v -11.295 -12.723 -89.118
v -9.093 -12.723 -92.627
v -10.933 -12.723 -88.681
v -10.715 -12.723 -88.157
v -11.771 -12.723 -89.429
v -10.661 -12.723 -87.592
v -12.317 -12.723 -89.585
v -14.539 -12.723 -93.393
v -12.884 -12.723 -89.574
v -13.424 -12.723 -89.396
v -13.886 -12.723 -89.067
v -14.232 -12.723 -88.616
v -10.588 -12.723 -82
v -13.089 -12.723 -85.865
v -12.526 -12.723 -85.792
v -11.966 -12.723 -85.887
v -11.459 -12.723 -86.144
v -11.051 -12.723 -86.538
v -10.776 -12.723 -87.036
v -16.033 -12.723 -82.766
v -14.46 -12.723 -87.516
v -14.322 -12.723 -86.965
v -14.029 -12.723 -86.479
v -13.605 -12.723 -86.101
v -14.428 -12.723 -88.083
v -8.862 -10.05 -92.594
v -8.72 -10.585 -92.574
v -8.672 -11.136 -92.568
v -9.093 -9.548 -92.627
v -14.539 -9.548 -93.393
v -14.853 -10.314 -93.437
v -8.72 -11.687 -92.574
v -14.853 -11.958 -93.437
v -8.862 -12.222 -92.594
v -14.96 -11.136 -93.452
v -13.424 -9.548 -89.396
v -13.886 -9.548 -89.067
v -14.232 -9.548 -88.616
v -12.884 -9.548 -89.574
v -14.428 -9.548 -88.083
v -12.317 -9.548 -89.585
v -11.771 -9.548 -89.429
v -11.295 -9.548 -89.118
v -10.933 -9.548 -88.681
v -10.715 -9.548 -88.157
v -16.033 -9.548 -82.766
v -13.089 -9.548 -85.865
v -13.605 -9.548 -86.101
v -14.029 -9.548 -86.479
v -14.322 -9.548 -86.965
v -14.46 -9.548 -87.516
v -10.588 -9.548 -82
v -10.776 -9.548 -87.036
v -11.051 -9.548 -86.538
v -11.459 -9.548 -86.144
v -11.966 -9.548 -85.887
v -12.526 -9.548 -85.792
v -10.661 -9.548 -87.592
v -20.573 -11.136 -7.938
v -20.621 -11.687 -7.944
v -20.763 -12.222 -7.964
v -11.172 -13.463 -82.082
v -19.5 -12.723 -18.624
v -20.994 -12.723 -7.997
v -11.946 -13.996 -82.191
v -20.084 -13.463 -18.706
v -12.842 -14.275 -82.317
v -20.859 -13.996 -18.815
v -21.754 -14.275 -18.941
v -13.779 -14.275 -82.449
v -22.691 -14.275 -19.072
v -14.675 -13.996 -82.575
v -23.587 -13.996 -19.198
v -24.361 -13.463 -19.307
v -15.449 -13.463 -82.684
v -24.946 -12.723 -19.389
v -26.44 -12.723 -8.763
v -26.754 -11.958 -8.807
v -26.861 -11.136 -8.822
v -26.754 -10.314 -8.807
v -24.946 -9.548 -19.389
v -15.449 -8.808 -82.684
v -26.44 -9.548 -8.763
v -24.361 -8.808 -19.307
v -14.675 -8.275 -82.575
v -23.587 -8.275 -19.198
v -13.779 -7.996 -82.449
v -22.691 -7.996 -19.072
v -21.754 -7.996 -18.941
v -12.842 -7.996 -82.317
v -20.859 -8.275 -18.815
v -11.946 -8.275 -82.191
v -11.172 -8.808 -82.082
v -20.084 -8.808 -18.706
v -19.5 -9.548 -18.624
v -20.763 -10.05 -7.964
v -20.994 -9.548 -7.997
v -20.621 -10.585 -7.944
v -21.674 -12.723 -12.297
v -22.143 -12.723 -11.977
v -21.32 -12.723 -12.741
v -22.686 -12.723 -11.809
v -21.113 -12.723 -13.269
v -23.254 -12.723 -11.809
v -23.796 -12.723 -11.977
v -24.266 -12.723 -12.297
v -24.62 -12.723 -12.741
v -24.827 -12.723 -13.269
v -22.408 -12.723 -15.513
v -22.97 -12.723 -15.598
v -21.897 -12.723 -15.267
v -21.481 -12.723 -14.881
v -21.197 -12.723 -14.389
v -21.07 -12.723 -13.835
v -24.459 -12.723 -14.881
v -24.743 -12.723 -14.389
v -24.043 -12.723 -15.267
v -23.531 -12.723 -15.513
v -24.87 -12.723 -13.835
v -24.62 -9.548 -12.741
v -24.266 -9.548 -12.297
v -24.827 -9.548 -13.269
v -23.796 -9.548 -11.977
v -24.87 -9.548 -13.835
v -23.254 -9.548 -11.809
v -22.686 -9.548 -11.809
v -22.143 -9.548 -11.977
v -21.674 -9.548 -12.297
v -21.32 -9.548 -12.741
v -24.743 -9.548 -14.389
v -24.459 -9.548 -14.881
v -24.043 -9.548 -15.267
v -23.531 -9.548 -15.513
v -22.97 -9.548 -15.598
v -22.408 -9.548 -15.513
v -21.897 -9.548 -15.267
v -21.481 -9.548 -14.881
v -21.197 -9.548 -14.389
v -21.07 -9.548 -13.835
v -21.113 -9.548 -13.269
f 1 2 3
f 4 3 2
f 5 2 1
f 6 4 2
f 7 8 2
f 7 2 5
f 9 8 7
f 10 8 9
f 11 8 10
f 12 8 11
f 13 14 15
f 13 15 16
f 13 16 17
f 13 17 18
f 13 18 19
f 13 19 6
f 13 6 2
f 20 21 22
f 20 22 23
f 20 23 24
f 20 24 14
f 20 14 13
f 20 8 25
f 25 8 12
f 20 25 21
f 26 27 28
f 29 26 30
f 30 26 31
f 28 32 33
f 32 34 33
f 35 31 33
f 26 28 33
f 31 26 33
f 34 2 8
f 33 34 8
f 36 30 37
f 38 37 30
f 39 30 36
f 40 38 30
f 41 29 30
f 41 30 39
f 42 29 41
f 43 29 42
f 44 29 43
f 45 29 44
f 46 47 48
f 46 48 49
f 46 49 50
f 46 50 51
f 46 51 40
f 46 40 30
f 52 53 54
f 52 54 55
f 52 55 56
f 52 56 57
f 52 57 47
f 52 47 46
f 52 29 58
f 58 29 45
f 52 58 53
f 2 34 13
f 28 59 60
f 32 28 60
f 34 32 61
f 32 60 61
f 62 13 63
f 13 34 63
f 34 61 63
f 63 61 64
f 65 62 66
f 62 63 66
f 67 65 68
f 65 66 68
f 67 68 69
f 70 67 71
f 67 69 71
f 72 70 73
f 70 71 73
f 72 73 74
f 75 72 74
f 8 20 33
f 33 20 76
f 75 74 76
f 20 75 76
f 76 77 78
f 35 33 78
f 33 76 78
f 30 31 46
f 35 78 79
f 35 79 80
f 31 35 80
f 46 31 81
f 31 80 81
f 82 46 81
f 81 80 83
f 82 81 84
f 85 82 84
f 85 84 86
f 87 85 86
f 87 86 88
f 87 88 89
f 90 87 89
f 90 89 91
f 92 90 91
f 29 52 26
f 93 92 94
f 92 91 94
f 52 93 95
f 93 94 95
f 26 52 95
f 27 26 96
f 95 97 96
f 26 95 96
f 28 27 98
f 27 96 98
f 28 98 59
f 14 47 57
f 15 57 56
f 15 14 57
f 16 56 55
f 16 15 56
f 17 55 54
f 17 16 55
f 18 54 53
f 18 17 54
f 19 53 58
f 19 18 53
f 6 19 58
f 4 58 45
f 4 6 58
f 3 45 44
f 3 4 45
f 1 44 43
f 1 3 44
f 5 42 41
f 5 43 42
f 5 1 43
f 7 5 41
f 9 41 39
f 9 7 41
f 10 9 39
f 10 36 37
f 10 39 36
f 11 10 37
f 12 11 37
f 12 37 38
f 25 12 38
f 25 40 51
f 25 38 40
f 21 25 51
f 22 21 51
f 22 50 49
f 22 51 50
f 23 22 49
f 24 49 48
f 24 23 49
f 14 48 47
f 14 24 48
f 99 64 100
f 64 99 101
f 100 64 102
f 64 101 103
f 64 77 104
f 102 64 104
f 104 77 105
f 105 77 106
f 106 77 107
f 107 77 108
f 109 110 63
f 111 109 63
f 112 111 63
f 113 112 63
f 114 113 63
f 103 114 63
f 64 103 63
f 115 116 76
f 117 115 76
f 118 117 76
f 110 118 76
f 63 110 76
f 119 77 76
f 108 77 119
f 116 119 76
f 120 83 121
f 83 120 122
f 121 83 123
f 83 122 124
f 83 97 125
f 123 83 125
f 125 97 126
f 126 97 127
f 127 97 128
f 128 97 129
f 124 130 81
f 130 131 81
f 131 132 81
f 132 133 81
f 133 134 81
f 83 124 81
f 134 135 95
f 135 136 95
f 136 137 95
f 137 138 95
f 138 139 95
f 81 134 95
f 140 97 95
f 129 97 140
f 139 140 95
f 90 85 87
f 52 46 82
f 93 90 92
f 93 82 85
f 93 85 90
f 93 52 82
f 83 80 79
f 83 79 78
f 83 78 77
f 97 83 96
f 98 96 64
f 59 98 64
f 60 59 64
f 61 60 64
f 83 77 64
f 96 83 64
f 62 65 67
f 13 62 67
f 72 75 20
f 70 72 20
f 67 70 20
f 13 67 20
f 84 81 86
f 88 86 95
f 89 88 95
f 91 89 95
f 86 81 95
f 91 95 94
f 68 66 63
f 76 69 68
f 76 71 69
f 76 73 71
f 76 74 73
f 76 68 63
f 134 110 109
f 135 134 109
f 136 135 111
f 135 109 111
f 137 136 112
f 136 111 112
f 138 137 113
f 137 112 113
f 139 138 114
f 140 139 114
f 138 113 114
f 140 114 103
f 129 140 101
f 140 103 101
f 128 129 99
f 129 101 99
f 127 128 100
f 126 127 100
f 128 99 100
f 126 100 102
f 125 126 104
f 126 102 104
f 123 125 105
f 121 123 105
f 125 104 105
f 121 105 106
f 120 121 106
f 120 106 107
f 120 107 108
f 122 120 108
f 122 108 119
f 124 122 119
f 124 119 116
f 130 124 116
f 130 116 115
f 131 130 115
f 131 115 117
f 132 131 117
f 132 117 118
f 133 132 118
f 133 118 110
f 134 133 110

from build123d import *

# Parameters (mm, degrees)
SKETCH2_W          = 10.7315
SKETCH2_H          = 1.5875
CUT_EXTRUDE1_DEPTH = 93.498486906
SKETCH3_R          = 1.905
CUT_EXTRUDE2_DEPTH = 98.35226363


with BuildPart() as part:
    # Sketch1 → Revolve1 (revolve)
    with BuildSketch(Plane(origin=(0, -11.13590516, 0), x_dir=(1, 0, 0), z_dir=(0, 1, 0))):
        Polygon((-20.573060678, 7.9375), (-23.717125316, 8.37963409), (-21.338443913, 25.294701841), (-14.194693913, 76.094701841), (-11.816012511, 93.009769593), (-8.671947873, 92.567635503), align=None)
    revolve(axis=Axis((-14.194693913, -11.13590516, -76.094701841), (0.13925483139909506, 0, -0.9902565788380351)))

    # Sketch2 → Cut-Extrude1 (cut, symmetric)
    with BuildSketch(Plane(origin=(-24.412739892, 0, -3.433041547), x_dir=(0.13925483139909503, 0, -0.9902565788380351), z_dir=(0.9902565788380351, 0, 0.13925483139909503))):
        with Locations((10.361013498, -13.51715516)):
            Rectangle(SKETCH2_W, SKETCH2_H)
        with Locations((10.361013498, -8.75465516)):
            Rectangle(SKETCH2_W, SKETCH2_H)
    cut_extrude1 = extrude(amount=CUT_EXTRUDE1_DEPTH, both=True, mode=Mode.SUBTRACT)

    # Sketch3 → Cut-Extrude2 (cut, through all)
    with BuildSketch(Plane.XZ.offset(12.72340516)):
        with Locations(Location((-22.969918704, -13.693103328, 0), (0, 0, 270))):
            Circle(SKETCH3_R)
    cut_extrude2 = extrude(amount=-CUT_EXTRUDE2_DEPTH, mode=Mode.SUBTRACT)

    # Mirror1: Cut-Extrude1, Cut-Extrude2 across plane
    add(cut_extrude1.mirror(Plane(origin=(6.646170979, 0, -47.261660294), x_dir=(0.9902565788380351, 0, 0.13925483139909509), z_dir=(-0.13925483139909509, 0, 0.9902565788380352))), mode=Mode.SUBTRACT)
    add(cut_extrude2.mirror(Plane(origin=(6.646170979, 0, -47.261660294), x_dir=(0.9902565788380351, 0, 0.13925483139909509), z_dir=(-0.13925483139909509, 0, 0.9902565788380352))), mode=Mode.SUBTRACT)


solid = part.part
